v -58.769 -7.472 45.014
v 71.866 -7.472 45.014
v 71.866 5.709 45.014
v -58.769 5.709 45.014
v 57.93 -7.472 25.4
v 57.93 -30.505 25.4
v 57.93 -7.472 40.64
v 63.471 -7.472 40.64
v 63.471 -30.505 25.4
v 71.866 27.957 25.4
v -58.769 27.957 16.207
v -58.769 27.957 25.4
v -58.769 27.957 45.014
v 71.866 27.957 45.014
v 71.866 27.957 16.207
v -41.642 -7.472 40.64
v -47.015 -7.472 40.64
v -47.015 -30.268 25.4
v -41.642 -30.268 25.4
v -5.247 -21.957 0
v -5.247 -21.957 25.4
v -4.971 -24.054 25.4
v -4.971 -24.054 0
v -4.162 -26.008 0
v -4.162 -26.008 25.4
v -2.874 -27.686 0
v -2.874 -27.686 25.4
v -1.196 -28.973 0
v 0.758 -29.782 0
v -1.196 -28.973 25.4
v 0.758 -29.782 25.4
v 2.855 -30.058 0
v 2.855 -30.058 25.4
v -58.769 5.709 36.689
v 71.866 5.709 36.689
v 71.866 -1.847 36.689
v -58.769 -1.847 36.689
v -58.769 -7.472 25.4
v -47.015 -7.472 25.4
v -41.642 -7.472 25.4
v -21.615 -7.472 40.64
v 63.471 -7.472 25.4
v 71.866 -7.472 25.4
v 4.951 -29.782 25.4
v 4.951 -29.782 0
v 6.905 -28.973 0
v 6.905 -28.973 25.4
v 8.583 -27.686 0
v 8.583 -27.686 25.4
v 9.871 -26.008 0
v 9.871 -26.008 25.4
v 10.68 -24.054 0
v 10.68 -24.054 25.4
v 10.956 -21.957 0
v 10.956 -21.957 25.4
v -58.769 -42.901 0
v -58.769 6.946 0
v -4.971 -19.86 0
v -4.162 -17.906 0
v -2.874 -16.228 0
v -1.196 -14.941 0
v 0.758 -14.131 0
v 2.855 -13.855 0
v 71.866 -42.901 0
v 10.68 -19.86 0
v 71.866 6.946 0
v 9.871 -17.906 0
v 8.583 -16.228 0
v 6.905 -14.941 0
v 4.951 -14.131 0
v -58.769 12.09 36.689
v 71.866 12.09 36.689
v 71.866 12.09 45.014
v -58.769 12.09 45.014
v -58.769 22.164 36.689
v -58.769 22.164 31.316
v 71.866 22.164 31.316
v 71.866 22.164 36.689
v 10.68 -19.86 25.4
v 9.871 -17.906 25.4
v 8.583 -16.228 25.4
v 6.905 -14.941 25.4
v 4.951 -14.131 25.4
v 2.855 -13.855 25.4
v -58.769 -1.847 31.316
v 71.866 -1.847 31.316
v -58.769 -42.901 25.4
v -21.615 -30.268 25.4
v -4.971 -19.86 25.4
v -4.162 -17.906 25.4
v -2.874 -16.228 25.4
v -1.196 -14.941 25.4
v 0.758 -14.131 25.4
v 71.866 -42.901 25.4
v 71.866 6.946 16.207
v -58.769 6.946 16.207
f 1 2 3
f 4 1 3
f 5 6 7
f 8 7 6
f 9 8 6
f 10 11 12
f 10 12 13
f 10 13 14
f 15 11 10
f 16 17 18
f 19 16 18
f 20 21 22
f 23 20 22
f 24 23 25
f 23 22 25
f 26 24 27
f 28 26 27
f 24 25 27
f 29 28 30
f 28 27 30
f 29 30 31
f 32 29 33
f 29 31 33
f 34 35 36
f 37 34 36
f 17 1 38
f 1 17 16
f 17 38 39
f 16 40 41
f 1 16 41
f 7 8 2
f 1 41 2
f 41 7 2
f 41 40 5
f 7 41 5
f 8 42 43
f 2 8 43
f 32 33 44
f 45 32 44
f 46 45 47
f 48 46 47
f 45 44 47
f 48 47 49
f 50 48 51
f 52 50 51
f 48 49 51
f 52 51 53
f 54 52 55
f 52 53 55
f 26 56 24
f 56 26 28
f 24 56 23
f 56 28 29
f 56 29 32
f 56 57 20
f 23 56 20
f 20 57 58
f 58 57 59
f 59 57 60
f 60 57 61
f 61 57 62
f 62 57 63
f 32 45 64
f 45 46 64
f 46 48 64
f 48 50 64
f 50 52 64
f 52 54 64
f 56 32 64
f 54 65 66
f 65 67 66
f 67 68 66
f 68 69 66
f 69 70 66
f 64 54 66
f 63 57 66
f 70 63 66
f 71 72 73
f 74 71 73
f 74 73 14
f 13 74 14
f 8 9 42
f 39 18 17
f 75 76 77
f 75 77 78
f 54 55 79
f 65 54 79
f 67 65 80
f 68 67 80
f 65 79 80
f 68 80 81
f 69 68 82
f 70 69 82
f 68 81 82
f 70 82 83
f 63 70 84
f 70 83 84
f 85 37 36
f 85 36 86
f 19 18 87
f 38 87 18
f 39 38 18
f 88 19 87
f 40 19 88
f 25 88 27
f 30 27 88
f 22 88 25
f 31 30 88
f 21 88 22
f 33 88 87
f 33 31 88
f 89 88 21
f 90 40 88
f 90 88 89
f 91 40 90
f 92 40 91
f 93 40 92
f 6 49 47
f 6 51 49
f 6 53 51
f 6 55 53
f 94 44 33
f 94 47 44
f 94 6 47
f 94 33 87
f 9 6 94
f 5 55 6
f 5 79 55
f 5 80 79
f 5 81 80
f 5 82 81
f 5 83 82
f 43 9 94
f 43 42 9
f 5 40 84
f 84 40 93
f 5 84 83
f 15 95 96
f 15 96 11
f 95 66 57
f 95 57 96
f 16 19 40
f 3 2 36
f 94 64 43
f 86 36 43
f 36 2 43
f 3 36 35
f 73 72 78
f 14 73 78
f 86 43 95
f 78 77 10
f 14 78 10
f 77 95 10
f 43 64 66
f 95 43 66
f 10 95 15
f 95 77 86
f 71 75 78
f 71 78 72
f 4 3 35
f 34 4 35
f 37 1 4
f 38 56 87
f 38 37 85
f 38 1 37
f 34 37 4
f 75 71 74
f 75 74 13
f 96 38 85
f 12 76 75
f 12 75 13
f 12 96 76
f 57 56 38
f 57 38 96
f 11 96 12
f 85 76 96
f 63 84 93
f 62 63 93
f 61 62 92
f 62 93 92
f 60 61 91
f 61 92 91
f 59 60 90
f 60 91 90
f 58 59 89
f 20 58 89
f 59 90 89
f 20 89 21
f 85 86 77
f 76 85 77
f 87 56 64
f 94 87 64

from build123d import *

# Parameters (mm, degrees)
F0_W      = 130.6354291737
F0_H      = 70.8588063717
F1_DEPTH  = 25.4
F2_W      = 21.0115239024
F2_H      = 16.2068661302
F3_DEPTH  = 139.7
F4_W      = 130.6354291737
F4_H      = 35.4294031858
F5_DEPTH  = 27.94
F7_DEPTH  = 157.48
F8_W      = 13.1810824387
F8_H      = 8.3256293517
F8_W_2    = 15.867670998
F9_DEPTH  = 147.32
F10_W     = 5.3731799126
F10_H     = 22.795913741
F11_DEPTH = 15.24
F13_DEPTH = 25.4
F14_W     = 5.5410936475
F14_H     = 23.0333786458
F15_DEPTH = 15.24
F17_DEPTH = 25.4
F19_DEPTH = 45.72


with BuildPart() as f1:
    # F0 (on Top) → F1 (new body)
    with BuildSketch(Plane.XY):
        with Locations((6.5485667437, -7.4720792472)):
            Rectangle(F0_W, F0_H)
    extrude(amount=F1_DEPTH)

    # F2 (on face) → F3 (cut)
    with BuildSketch(Plane.YZ.offset(71.8662813306)):
        with Locations((17.4515619874, 8.1034330651)):
            Rectangle(F2_W, F2_H)
    extrude(amount=-F3_DEPTH, mode=Mode.SUBTRACT)

    # F4 (on face) → F5 (join)
    with BuildSketch(Plane.XY.offset(25.4)):
        with Locations((6.5485667437, 10.2426223457)):
            Rectangle(F4_W, F4_H)
    extrude(amount=F5_DEPTH)

    # F6 (on face) → F7 (cut)
    with BuildSketch(Plane.YZ.offset(71.8662813306)):
        Polygon((12.0896529406, 53.34), (5.7090031914, 53.34), (5.7090031914, 36.6887412965), (-1.8470302457, 36.6887412965), (-1.8470302457, 31.315561384), (22.164363414, 31.315561384), (22.164363414, 36.6887412965), (12.0896529406, 36.6887412965), align=None)
    extrude(amount=-F7_DEPTH, mode=Mode.SUBTRACT)

    # F8 (on face) → F9 (cut)
    with BuildSketch(Plane.YZ.offset(71.8662813306)):
        with Locations((-0.8815380279, 49.1771853241)):
            Rectangle(F8_W, F8_H)
        with Locations((20.0234884396, 49.1771853241)):
            Rectangle(F8_W_2, F8_H)
    extrude(amount=-F9_DEPTH, mode=Mode.SUBTRACT)

    # F10 (on face) → F11 (join)
    with BuildSketch(Plane.XY.offset(25.4)):
        with Locations((-44.3287305534, -18.8700361177)):
            Rectangle(F10_W, F10_H)
    extrude(amount=F11_DEPTH)

    # F12 (on face) → F13 (cut)
    with BuildSketch(Plane(origin=(-47.0153205097, 0, 0), x_dir=(0, -1, 0), z_dir=(-1, 0, 0))):
        Polygon((30.2679929882, 40.64), (7.4720792472, 40.64), (30.2679929882, 25.4), align=None)
    extrude(amount=-F13_DEPTH, mode=Mode.SUBTRACT)

    # F14 (on face) → F15 (join)
    with BuildSketch(Plane.XY.offset(25.4)):
        with Locations((60.7001371682, -18.9887685701)):
            Rectangle(F14_W, F14_H)
    extrude(amount=F15_DEPTH)

    # F16 (on face) → F17 (cut)
    with BuildSketch(Plane(origin=(57.9295903444, 0, 0), x_dir=(0, -1, 0), z_dir=(-1, 0, 0))):
        Polygon((30.505457893, 40.64), (7.4720792472, 40.64), (30.505457893, 25.4), align=None)
    extrude(amount=-F17_DEPTH, mode=Mode.SUBTRACT)

    # F18 (on face) → F19 (cut)
    with BuildSketch(Plane.XY.offset(25.4)):
        with BuildLine():
            Line((-5.2471338319, -21.9567809254), (2.8545020614, -21.9567809254))
            Line((2.8545020614, -21.9567809254), (2.8545020614, -13.8551450321))
            ThreePointArc((2.8545020614, -13.8551450321), (-2.8742196175, -16.2280592466), (-5.2471338319, -21.9567809254))
        make_face()
        with BuildLine():
            Line((2.8545020614, -13.8551450321), (2.8545020614, -21.9567809254))
            Line((2.8545020614, -21.9567809254), (10.9561379547, -21.9567809254))
            ThreePointArc((10.9561379547, -21.9567809254), (8.5832237402, -16.2280592466), (2.8545020614, -13.8551450321))
        make_face()
        with BuildLine():
            Line((2.8545020614, -30.0584168187), (2.8545020614, -21.9567809254))
            Line((2.8545020614, -21.9567809254), (-5.2471338319, -21.9567809254))
            ThreePointArc((-5.2471338319, -21.9567809254), (-2.8742196175, -27.6855026042), (2.8545020614, -30.0584168187))
        make_face()
        with BuildLine():
            Line((10.9561379547, -21.9567809254), (2.8545020614, -21.9567809254))
            Line((2.8545020614, -21.9567809254), (2.8545020614, -30.0584168187))
            ThreePointArc((2.8545020614, -30.0584168187), (8.5832237402, -27.6855026042), (10.9561379547, -21.9567809254))
        make_face()
    extrude(amount=-F19_DEPTH, mode=Mode.SUBTRACT)


solid = f1.part
